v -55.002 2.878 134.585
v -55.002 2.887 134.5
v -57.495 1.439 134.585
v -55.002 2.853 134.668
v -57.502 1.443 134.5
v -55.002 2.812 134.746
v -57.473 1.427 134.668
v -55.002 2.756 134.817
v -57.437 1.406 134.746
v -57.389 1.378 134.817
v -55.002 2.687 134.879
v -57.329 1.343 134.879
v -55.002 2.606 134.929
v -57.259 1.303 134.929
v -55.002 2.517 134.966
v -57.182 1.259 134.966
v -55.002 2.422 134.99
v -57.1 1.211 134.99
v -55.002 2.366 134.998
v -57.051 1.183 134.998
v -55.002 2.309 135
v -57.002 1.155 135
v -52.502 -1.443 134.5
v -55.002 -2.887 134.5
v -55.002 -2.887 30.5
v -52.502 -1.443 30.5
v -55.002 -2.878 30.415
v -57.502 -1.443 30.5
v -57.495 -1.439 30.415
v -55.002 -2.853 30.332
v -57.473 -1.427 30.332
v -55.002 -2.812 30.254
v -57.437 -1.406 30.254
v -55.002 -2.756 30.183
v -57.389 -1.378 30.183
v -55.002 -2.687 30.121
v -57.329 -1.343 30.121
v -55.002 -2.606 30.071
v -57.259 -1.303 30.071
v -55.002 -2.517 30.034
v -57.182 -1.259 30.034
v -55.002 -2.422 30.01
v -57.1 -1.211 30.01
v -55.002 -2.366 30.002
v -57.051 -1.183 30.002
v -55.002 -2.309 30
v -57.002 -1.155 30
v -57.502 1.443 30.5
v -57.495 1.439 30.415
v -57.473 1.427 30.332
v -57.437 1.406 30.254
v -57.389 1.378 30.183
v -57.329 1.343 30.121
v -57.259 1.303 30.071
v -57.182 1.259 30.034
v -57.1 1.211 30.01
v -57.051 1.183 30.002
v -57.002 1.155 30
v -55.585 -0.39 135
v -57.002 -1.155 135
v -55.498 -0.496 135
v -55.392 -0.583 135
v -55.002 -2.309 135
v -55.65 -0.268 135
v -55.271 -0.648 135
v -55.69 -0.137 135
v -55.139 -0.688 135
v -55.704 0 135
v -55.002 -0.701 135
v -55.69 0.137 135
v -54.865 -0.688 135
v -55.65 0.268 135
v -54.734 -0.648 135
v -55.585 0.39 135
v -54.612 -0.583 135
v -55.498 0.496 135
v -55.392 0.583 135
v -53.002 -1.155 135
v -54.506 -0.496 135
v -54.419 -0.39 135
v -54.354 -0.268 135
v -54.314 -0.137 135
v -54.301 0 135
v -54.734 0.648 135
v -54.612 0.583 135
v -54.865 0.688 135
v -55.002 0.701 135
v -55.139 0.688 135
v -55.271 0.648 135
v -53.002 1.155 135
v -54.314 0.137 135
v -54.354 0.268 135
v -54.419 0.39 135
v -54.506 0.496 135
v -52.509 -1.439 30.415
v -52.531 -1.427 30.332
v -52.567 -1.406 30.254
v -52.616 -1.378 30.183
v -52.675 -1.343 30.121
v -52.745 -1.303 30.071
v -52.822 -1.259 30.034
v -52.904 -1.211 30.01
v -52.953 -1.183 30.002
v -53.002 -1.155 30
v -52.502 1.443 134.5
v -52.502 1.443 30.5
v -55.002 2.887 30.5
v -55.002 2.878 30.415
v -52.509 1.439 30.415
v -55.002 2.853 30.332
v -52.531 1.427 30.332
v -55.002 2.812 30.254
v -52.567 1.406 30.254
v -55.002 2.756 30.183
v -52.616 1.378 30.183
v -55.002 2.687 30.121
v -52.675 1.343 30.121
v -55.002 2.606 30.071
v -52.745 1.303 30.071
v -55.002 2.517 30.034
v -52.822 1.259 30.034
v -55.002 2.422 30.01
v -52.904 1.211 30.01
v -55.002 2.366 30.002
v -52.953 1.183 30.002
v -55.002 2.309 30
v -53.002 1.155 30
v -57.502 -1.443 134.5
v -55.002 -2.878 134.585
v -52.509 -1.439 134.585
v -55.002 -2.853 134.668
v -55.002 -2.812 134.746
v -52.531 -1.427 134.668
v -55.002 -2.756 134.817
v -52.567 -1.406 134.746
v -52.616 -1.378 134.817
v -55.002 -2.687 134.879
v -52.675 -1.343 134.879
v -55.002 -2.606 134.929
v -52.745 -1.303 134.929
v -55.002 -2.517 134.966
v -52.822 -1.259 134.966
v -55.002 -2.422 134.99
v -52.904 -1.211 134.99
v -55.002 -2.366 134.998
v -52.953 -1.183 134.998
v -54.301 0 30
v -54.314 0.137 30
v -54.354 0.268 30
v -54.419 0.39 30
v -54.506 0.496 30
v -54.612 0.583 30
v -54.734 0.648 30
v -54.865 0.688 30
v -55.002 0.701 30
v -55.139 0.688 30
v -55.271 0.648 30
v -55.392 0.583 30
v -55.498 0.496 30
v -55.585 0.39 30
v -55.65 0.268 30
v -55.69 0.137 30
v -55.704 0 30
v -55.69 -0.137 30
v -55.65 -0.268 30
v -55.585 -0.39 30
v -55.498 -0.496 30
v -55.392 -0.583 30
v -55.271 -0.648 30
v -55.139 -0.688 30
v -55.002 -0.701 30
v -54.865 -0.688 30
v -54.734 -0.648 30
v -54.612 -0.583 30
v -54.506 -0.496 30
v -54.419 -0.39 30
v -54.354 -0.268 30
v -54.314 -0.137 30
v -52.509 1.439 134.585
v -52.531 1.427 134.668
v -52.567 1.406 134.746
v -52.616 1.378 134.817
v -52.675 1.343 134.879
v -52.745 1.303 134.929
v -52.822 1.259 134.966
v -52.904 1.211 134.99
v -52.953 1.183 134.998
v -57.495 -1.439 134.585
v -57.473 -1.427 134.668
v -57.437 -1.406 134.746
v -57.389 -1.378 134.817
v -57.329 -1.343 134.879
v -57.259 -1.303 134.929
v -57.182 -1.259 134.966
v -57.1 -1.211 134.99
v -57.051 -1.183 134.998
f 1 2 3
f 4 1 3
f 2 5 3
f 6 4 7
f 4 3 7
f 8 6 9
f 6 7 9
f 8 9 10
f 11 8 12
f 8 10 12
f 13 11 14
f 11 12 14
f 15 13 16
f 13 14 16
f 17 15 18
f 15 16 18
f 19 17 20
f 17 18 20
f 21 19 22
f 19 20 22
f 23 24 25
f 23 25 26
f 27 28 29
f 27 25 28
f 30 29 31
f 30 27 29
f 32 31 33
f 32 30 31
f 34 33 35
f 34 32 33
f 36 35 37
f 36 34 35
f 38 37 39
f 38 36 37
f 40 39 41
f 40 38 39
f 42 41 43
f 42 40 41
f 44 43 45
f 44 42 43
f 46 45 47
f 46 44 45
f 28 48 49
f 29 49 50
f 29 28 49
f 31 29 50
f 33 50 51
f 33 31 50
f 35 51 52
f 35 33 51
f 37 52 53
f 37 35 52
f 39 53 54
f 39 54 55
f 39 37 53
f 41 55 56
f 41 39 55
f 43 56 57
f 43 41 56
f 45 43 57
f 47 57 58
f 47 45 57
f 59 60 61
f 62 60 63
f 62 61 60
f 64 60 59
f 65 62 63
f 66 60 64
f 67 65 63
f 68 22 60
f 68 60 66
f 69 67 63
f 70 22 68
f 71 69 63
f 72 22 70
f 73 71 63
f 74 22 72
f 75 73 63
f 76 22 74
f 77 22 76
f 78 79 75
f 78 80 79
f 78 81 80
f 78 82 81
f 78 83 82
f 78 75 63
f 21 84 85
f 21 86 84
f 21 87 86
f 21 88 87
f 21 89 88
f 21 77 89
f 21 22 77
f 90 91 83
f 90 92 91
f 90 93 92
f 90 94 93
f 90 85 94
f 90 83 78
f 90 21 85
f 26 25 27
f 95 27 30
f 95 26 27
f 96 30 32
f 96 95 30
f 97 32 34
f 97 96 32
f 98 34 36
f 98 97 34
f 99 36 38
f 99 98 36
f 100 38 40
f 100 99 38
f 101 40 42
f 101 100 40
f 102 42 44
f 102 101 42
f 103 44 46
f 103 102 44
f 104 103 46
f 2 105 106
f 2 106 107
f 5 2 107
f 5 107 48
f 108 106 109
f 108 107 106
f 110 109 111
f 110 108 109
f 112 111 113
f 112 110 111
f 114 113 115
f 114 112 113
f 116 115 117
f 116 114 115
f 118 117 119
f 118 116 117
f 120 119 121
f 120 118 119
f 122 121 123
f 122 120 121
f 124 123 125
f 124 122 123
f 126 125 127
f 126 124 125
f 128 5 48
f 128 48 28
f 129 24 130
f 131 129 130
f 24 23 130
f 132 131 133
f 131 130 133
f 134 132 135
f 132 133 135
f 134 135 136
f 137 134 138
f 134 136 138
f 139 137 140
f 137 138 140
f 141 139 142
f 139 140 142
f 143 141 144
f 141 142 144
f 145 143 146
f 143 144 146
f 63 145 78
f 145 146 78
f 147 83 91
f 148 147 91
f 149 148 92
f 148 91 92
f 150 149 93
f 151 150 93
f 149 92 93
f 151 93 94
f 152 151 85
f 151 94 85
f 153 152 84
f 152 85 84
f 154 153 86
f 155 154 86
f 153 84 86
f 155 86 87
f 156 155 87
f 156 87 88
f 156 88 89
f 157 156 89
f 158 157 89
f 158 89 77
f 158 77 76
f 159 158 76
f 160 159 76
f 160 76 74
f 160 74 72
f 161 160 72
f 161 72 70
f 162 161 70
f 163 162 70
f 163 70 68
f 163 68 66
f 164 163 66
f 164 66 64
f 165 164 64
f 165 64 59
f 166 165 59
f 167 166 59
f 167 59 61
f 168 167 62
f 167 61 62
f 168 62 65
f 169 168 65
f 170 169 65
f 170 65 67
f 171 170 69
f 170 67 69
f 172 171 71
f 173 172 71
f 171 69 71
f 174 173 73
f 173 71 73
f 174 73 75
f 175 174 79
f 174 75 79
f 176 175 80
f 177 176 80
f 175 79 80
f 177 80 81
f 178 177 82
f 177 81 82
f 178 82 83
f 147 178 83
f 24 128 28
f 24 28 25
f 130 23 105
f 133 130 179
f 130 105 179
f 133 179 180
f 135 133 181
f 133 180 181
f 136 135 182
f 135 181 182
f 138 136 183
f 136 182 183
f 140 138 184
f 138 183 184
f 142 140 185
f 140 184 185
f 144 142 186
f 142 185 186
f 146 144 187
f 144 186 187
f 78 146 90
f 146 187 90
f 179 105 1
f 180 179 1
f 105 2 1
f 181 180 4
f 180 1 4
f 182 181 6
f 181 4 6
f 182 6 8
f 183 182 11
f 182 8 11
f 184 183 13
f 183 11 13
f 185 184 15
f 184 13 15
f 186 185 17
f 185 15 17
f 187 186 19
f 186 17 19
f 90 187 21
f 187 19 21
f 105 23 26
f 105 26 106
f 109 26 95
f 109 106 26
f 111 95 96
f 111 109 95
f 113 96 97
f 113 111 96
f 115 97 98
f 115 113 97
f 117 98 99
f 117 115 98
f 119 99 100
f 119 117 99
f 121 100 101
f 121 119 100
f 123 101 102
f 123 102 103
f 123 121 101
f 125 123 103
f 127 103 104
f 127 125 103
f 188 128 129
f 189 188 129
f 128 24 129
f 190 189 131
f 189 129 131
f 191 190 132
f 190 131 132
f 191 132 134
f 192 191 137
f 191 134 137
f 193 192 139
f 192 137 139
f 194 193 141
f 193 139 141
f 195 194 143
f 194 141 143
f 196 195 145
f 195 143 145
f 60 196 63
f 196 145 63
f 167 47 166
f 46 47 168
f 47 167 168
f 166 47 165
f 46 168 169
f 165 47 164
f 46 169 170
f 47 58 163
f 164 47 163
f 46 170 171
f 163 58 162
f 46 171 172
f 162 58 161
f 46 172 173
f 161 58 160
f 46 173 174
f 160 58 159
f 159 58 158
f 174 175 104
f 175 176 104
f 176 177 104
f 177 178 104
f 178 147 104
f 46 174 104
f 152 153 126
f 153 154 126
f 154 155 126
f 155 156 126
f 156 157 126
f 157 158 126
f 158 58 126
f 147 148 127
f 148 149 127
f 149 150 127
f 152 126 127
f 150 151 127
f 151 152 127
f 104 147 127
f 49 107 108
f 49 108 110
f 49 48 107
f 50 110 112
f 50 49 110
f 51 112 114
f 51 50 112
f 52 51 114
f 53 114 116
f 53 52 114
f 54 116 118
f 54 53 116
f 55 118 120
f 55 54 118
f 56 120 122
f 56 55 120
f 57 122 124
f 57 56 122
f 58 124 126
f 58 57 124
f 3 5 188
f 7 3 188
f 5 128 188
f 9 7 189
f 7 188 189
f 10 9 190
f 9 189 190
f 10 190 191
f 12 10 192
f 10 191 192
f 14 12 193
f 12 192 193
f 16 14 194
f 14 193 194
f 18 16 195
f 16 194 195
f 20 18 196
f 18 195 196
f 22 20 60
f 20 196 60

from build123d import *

# Parameters (mm, degrees)
RESSALTO_EXTRUS_O1_DEPTH = 105
FILETE1_R                = 0.5
ESBO_O2_R                = 0.701481341
CORTE_EXTRUS_O1_DEPTH    = 106


with BuildPart() as part:
    # Esboço1 → Ressalto-extrusão1 (new body)
    with BuildSketch(Plane.XY.offset(135)):
        Polygon((-55.002122675, 2.886751346), (-57.502122675, 1.443375673), (-57.502122675, -1.443375673), (-55.002122675, -2.886751346), (-52.502122675, -1.443375673), (-52.502122675, 1.443375673), align=None)
    extrude(amount=-RESSALTO_EXTRUS_O1_DEPTH)

    # Filete1
    filete1_edges = [part.edges().sort_by_distance(p)[0] for p in [
        (-57.502122675, 0, 30),
        (-56.252122675, -2.165063509, 30),
        (-53.752122675, -2.165063509, 30),
        (-52.502122675, 0, 30),
        (-53.752122675, 2.165063509, 30),
        (-52.502122675, 0, 135),
        (-53.752122675, -2.165063509, 135),
        (-56.252122675, -2.165063509, 135),
        (-57.502122675, 0, 135),
        (-56.252122675, 2.165063509, 135),
        (-53.752122675, 2.165063509, 135),
        (-56.252122675, 2.165063509, 30),
    ]]
    fillet(filete1_edges, radius=FILETE1_R)

    # Esboço2 → Corte-extrusão1 (cut, through all)
    with BuildSketch(Plane.XY.offset(135)):
        with Locations((-55.002122675, 0)):
            Circle(ESBO_O2_R)
    extrude(amount=-CORTE_EXTRUS_O1_DEPTH, mode=Mode.SUBTRACT)


solid = part.part
